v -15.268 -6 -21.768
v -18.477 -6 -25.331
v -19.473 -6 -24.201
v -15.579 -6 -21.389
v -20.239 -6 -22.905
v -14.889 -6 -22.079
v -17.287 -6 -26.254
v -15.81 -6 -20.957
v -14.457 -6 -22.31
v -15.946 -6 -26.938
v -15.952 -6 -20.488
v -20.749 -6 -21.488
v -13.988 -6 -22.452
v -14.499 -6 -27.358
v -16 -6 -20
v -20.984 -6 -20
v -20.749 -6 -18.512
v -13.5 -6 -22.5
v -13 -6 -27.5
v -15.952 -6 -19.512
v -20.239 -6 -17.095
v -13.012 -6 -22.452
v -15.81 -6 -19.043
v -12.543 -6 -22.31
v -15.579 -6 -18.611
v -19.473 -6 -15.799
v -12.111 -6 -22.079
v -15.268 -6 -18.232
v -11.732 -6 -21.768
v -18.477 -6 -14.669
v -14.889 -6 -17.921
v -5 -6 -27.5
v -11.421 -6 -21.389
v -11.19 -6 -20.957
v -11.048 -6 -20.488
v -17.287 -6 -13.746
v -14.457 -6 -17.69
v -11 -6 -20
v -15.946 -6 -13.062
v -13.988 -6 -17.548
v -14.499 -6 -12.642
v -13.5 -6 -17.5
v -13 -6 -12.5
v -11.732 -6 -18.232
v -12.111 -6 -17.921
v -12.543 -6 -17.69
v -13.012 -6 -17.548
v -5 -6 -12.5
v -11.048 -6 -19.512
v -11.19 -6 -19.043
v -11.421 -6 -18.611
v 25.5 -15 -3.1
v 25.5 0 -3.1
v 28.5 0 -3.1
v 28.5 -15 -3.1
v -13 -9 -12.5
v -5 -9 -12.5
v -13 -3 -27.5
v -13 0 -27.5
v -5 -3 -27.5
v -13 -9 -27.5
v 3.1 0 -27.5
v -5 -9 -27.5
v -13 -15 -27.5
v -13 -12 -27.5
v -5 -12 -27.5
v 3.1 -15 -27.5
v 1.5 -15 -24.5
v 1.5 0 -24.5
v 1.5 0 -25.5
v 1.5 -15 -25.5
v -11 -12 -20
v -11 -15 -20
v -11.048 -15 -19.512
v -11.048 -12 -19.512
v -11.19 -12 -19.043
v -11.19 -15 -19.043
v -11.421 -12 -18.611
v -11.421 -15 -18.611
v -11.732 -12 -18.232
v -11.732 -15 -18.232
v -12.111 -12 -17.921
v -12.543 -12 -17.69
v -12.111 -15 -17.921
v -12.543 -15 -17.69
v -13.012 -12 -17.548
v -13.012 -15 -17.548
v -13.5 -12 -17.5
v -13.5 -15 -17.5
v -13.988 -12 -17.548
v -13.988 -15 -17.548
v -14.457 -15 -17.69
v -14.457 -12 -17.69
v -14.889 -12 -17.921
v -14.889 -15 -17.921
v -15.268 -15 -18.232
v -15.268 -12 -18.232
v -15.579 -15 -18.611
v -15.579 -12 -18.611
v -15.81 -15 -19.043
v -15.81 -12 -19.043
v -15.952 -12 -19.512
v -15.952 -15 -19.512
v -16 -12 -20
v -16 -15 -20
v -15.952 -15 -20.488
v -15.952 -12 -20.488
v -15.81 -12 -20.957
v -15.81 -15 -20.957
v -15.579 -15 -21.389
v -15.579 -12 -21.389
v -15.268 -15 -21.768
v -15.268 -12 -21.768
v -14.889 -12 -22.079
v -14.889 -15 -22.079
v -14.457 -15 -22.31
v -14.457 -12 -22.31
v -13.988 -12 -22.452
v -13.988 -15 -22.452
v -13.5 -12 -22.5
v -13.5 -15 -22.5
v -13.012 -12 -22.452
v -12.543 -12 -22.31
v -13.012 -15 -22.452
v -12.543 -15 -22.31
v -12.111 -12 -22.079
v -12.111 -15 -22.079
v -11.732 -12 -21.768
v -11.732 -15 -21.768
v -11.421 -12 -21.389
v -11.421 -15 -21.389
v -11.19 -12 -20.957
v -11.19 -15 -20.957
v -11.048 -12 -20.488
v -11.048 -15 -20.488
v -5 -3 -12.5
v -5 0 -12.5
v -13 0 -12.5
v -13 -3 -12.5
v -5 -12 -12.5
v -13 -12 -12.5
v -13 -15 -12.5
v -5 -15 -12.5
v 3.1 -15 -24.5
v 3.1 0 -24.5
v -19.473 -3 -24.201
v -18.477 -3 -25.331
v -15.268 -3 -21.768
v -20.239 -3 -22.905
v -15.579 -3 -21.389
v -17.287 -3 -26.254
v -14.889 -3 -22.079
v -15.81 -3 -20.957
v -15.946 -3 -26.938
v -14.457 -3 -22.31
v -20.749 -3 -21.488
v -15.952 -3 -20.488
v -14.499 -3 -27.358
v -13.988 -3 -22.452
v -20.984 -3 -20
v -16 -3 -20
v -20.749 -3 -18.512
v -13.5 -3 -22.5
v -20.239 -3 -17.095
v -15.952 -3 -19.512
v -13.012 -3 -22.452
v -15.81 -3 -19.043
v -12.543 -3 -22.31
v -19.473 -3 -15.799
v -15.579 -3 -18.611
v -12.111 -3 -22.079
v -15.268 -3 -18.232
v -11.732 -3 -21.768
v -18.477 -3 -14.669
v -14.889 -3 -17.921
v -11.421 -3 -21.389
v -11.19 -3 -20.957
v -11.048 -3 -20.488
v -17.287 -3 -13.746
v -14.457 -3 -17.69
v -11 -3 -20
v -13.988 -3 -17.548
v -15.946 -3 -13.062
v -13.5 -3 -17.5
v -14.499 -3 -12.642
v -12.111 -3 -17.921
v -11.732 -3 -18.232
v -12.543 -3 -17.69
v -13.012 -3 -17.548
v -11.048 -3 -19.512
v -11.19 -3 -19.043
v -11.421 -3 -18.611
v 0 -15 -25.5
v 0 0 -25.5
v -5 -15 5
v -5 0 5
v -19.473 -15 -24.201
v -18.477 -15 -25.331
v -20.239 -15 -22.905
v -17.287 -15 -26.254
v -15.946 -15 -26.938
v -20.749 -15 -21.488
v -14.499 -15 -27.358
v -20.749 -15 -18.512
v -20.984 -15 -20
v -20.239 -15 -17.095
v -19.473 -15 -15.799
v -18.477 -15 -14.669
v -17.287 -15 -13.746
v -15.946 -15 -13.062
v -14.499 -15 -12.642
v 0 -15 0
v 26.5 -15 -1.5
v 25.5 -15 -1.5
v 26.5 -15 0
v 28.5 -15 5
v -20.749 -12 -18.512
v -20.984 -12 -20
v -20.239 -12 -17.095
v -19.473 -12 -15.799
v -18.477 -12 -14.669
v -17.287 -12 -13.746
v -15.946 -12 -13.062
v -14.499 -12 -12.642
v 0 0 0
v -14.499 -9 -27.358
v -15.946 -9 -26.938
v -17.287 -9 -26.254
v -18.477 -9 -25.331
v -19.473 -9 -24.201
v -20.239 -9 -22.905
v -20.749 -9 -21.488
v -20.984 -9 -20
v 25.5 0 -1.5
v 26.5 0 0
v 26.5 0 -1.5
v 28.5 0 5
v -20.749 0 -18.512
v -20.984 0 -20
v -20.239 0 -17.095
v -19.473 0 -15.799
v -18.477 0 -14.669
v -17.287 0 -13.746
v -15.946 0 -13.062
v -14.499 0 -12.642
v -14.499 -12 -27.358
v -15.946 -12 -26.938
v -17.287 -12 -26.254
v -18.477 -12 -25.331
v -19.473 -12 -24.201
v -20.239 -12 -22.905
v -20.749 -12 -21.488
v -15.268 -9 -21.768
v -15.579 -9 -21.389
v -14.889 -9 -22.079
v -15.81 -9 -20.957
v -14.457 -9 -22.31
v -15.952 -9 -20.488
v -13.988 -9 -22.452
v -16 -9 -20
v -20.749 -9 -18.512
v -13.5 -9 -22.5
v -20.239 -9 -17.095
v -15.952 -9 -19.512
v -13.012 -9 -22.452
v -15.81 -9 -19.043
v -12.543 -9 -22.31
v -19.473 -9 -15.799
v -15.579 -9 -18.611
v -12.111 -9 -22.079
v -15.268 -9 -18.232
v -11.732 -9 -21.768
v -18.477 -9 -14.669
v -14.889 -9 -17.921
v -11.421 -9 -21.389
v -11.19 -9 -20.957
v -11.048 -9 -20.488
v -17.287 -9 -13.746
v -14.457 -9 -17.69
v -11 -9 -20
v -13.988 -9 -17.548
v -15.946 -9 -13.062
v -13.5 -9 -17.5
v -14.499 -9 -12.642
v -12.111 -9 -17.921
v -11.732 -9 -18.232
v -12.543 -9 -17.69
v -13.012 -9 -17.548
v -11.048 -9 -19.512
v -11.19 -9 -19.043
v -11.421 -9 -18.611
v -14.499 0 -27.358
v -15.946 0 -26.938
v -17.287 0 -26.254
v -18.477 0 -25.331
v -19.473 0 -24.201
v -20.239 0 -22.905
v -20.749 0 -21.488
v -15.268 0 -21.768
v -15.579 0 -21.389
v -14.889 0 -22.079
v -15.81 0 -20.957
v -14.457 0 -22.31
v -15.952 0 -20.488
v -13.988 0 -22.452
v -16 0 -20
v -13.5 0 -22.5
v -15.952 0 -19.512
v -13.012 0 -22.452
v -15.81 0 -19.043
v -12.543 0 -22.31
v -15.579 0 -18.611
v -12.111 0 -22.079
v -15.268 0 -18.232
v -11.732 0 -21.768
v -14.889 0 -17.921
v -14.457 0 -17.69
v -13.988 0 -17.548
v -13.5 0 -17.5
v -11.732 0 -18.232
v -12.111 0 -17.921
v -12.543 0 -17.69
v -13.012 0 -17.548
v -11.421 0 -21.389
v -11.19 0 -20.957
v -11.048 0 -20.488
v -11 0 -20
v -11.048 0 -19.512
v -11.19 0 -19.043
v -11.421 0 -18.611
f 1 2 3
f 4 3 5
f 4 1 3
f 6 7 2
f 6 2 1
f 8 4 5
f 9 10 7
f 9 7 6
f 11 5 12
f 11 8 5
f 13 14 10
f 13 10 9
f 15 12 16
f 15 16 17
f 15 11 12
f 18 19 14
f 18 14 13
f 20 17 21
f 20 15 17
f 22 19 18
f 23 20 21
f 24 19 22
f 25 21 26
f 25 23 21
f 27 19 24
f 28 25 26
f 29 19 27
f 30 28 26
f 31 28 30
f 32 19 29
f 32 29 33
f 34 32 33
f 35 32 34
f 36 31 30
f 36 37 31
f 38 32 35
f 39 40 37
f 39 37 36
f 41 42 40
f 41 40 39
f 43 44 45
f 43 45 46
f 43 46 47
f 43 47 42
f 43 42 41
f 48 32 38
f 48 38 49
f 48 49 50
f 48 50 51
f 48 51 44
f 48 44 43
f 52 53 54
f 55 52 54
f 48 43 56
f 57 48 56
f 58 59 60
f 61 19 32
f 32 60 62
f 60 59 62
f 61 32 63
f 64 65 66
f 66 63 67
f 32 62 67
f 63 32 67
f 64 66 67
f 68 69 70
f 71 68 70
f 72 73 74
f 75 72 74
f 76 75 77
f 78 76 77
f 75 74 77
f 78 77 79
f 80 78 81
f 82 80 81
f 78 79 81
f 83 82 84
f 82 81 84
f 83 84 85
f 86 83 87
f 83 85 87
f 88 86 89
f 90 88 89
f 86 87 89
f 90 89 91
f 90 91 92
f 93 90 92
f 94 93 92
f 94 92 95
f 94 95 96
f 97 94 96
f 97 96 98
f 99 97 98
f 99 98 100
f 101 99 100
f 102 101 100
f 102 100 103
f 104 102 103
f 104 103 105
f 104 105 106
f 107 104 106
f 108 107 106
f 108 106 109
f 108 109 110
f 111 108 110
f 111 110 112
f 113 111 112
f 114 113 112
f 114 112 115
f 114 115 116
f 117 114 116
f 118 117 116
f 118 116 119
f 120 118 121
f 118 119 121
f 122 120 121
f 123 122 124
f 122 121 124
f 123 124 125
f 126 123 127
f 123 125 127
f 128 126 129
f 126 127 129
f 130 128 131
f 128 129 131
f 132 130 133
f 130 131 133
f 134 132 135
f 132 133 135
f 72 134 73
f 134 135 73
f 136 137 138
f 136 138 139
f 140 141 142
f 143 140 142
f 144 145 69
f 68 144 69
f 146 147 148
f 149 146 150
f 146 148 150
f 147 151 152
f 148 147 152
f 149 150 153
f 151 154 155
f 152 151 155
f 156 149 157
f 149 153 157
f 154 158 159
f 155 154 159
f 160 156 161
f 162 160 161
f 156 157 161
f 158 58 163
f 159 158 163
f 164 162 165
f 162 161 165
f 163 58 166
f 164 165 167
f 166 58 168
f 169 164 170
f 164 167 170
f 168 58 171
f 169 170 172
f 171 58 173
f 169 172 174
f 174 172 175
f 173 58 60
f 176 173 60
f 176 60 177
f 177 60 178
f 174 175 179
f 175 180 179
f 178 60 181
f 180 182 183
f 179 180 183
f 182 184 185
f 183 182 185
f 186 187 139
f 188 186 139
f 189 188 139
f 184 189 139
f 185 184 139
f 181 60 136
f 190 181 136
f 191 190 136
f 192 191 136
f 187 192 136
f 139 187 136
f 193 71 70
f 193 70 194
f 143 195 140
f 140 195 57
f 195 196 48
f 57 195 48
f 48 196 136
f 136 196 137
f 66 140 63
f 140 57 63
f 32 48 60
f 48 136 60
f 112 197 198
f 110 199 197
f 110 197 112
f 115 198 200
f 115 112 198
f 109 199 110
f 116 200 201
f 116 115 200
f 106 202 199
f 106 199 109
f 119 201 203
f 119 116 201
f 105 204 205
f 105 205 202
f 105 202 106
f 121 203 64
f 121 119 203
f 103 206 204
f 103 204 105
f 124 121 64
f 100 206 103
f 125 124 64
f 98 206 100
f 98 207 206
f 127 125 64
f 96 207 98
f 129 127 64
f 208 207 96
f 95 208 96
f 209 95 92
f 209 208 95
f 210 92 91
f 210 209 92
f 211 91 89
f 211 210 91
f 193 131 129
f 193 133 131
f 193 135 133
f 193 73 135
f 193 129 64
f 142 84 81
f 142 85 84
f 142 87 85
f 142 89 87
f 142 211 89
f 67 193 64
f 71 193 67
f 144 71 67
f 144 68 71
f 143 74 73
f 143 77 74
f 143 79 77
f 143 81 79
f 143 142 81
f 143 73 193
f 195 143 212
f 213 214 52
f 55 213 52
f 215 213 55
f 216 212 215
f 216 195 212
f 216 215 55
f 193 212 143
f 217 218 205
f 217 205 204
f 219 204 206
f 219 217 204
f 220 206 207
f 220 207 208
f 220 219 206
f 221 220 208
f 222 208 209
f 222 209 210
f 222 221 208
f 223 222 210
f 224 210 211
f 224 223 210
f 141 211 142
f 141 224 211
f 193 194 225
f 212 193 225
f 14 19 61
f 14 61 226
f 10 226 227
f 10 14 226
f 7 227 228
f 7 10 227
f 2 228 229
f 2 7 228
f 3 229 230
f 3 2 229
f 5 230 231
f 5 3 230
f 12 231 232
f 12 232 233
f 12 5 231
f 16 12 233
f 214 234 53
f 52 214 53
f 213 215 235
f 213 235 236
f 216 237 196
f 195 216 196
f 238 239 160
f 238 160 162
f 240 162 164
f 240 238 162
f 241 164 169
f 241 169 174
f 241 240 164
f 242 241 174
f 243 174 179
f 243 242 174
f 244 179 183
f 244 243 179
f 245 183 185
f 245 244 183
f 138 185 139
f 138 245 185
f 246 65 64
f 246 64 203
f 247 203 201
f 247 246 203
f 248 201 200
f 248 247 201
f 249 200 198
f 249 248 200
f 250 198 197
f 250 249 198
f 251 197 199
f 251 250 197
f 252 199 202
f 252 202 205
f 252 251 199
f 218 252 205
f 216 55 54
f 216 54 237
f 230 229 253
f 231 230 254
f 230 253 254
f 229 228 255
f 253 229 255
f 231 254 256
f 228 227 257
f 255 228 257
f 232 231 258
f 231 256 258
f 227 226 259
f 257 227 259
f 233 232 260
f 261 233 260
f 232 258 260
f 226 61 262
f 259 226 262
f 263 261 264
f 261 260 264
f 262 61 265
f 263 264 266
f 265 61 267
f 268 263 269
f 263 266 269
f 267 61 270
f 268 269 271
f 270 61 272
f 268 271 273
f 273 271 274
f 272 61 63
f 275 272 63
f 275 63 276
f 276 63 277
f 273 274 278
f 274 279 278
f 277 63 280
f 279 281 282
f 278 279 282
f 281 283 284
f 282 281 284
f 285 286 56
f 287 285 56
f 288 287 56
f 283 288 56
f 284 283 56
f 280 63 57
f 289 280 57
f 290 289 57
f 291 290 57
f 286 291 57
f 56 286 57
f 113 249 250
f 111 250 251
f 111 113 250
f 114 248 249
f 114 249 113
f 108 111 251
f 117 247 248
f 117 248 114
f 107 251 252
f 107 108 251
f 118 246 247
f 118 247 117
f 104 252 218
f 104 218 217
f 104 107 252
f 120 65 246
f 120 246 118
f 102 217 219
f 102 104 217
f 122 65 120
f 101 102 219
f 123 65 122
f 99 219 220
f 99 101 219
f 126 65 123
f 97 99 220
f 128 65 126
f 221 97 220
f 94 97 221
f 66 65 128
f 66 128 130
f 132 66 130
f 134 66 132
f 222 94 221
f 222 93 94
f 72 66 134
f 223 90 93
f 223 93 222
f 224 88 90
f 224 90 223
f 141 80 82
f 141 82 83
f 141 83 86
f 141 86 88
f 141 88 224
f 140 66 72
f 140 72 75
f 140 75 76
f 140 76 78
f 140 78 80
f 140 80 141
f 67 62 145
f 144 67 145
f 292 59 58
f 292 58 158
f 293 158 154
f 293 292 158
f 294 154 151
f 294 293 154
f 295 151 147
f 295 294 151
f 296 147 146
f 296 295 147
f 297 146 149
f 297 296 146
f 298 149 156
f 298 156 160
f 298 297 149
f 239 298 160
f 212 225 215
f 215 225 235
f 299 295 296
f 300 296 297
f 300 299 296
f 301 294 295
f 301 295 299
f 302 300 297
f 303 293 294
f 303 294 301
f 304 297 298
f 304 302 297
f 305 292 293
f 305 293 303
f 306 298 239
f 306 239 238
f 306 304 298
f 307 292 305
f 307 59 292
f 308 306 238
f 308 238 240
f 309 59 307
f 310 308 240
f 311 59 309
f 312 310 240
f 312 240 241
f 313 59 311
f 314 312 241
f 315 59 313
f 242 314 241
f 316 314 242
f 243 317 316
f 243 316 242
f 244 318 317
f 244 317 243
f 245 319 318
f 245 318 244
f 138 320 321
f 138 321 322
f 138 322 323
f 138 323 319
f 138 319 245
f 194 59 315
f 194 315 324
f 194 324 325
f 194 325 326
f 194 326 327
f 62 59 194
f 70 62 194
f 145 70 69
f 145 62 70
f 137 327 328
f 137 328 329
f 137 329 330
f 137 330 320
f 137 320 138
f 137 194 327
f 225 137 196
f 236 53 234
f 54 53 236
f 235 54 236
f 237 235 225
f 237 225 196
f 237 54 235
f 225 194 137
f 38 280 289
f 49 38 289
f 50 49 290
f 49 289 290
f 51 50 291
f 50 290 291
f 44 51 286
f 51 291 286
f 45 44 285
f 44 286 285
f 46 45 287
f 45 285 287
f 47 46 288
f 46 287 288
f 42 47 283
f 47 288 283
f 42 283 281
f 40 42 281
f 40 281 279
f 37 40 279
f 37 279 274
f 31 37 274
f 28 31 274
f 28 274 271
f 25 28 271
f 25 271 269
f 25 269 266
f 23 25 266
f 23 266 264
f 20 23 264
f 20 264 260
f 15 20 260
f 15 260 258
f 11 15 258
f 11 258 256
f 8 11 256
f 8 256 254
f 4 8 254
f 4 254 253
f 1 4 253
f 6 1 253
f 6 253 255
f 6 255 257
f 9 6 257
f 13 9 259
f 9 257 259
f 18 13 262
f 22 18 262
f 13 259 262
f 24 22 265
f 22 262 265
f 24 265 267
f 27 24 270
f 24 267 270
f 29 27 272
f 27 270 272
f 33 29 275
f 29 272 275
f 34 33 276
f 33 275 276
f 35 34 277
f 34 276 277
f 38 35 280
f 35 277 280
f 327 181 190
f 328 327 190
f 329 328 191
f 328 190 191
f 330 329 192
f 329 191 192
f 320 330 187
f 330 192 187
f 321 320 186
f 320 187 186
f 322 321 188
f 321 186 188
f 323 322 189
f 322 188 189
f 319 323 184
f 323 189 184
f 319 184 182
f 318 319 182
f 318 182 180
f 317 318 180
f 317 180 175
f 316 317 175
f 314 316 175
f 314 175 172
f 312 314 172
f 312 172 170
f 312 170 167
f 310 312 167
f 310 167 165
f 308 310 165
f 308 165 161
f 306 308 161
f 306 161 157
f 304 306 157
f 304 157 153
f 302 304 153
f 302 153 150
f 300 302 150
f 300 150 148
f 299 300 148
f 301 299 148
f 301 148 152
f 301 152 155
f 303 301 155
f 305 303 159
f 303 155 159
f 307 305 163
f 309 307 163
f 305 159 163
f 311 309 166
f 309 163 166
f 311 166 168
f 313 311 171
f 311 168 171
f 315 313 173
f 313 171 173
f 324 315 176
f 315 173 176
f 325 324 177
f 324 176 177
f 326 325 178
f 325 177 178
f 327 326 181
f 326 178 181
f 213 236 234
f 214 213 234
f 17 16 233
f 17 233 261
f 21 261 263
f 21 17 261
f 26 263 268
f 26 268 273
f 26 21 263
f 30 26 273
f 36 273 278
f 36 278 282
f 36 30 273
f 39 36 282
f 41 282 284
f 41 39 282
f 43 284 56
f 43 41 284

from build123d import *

# Parameters (mm, degrees)
F1_DEPTH    = 15
F2_W        = 3
F2_H        = 15
F3_DEPTH    = 16
F5_DEPTH    = 25
F6_T1_DEPTH = 43
F6_T3_DEPTH = 43
F6_T5_DEPTH = 43


# Not quite as in the source:
# - a fillet or chamfer that OpenCascade refuses, or shapes differently, is made with other operations: its cross-section is extruded or revolved along the edge and cut away or added


with BuildPart() as f1:
    # F0 (on Front) → F1 (new body)
    with BuildSketch(Plane.XZ):
        Polygon((0, -23.585311383), (0, 0), (25, 0), (26.5, 0), (26.5, -1.5), (25.5, -1.5), (25.5, -3.1), (28.5, -3.1), (28.5, 5), (25, 5), (-5, 5), (-5, -24), (-5, -25.5), (-5, -27.5), (0, -27.5), (3.1, -27.5), (3.1, -24.5), (1.5, -24.5), (1.5, -25.5), (0, -25.5), (0, -25.085311383), align=None)
    extrude(amount=F1_DEPTH)

    # F2 (on face) → F3 (join)
    with BuildSketch(Plane(origin=(-5, 0, 0), x_dir=(0, -1, 0), z_dir=(-1, 0, 0))):
        with Locations((1.5, -20)):
            Rectangle(F2_W, F2_H)
        with Locations((7.5, -20)):
            Rectangle(F2_W, F2_H)
        with Locations((13.5, -20)):
            Rectangle(F2_W, F2_H)
    extrude(amount=F3_DEPTH)

    # F4 (on face) → F5 (cut)
    with BuildSketch(Plane.XZ.offset(15)):
        with BuildLine():
            ThreePointArc((-16, -20), (-13.5, -22.5), (-11, -20))
            ThreePointArc((-11, -20), (-13.5, -17.5), (-16, -20))
        make_face()
    extrude(amount=-F5_DEPTH, mode=Mode.SUBTRACT)

    # F6: fillet of radius 8 on 5 edges, made by hand

    # F6_s2 → F6_t1 (cut)
    with BuildSketch(Plane.XZ.offset(-8)):
        with BuildLine():
            ThreePointArc((-21, -20.5), (-18.6568542495, -14.8431457505), (-13, -12.5))
            Line((-13, -12.5), (-21, -12.5))
            Line((-21, -12.5), (-21, -20.5))
        make_face()
    extrude(amount=F6_T1_DEPTH, mode=Mode.SUBTRACT)

    # F6_s4 → F6_t3 (cut)
    with BuildSketch(Plane.XZ.offset(-14)):
        with BuildLine():
            ThreePointArc((-21, -20.5), (-18.6568542495, -14.8431457505), (-13, -12.5))
            Line((-13, -12.5), (-21, -12.5))
            Line((-21, -12.5), (-21, -20.5))
        make_face()
        with BuildLine():
            ThreePointArc((-13, -27.5), (-18.6568542495, -25.1568542495), (-21, -19.5))
            Line((-21, -19.5), (-21, -27.5))
            Line((-21, -27.5), (-13, -27.5))
        make_face()
    extrude(amount=F6_T3_DEPTH, mode=Mode.SUBTRACT)

    # F6_s6 → F6_t5 (cut)
    with BuildSketch(Plane.XZ.offset(-20)):
        with BuildLine():
            ThreePointArc((-21, -20.5), (-18.6568542495, -14.8431457505), (-13, -12.5))
            Line((-13, -12.5), (-21, -12.5))
            Line((-21, -12.5), (-21, -20.5))
        make_face()
        with BuildLine():
            ThreePointArc((-13, -27.5), (-18.6568542495, -25.1568542495), (-21, -19.5))
            Line((-21, -19.5), (-21, -27.5))
            Line((-21, -27.5), (-13, -27.5))
        make_face()
    extrude(amount=F6_T5_DEPTH, mode=Mode.SUBTRACT)


solid = f1.part
